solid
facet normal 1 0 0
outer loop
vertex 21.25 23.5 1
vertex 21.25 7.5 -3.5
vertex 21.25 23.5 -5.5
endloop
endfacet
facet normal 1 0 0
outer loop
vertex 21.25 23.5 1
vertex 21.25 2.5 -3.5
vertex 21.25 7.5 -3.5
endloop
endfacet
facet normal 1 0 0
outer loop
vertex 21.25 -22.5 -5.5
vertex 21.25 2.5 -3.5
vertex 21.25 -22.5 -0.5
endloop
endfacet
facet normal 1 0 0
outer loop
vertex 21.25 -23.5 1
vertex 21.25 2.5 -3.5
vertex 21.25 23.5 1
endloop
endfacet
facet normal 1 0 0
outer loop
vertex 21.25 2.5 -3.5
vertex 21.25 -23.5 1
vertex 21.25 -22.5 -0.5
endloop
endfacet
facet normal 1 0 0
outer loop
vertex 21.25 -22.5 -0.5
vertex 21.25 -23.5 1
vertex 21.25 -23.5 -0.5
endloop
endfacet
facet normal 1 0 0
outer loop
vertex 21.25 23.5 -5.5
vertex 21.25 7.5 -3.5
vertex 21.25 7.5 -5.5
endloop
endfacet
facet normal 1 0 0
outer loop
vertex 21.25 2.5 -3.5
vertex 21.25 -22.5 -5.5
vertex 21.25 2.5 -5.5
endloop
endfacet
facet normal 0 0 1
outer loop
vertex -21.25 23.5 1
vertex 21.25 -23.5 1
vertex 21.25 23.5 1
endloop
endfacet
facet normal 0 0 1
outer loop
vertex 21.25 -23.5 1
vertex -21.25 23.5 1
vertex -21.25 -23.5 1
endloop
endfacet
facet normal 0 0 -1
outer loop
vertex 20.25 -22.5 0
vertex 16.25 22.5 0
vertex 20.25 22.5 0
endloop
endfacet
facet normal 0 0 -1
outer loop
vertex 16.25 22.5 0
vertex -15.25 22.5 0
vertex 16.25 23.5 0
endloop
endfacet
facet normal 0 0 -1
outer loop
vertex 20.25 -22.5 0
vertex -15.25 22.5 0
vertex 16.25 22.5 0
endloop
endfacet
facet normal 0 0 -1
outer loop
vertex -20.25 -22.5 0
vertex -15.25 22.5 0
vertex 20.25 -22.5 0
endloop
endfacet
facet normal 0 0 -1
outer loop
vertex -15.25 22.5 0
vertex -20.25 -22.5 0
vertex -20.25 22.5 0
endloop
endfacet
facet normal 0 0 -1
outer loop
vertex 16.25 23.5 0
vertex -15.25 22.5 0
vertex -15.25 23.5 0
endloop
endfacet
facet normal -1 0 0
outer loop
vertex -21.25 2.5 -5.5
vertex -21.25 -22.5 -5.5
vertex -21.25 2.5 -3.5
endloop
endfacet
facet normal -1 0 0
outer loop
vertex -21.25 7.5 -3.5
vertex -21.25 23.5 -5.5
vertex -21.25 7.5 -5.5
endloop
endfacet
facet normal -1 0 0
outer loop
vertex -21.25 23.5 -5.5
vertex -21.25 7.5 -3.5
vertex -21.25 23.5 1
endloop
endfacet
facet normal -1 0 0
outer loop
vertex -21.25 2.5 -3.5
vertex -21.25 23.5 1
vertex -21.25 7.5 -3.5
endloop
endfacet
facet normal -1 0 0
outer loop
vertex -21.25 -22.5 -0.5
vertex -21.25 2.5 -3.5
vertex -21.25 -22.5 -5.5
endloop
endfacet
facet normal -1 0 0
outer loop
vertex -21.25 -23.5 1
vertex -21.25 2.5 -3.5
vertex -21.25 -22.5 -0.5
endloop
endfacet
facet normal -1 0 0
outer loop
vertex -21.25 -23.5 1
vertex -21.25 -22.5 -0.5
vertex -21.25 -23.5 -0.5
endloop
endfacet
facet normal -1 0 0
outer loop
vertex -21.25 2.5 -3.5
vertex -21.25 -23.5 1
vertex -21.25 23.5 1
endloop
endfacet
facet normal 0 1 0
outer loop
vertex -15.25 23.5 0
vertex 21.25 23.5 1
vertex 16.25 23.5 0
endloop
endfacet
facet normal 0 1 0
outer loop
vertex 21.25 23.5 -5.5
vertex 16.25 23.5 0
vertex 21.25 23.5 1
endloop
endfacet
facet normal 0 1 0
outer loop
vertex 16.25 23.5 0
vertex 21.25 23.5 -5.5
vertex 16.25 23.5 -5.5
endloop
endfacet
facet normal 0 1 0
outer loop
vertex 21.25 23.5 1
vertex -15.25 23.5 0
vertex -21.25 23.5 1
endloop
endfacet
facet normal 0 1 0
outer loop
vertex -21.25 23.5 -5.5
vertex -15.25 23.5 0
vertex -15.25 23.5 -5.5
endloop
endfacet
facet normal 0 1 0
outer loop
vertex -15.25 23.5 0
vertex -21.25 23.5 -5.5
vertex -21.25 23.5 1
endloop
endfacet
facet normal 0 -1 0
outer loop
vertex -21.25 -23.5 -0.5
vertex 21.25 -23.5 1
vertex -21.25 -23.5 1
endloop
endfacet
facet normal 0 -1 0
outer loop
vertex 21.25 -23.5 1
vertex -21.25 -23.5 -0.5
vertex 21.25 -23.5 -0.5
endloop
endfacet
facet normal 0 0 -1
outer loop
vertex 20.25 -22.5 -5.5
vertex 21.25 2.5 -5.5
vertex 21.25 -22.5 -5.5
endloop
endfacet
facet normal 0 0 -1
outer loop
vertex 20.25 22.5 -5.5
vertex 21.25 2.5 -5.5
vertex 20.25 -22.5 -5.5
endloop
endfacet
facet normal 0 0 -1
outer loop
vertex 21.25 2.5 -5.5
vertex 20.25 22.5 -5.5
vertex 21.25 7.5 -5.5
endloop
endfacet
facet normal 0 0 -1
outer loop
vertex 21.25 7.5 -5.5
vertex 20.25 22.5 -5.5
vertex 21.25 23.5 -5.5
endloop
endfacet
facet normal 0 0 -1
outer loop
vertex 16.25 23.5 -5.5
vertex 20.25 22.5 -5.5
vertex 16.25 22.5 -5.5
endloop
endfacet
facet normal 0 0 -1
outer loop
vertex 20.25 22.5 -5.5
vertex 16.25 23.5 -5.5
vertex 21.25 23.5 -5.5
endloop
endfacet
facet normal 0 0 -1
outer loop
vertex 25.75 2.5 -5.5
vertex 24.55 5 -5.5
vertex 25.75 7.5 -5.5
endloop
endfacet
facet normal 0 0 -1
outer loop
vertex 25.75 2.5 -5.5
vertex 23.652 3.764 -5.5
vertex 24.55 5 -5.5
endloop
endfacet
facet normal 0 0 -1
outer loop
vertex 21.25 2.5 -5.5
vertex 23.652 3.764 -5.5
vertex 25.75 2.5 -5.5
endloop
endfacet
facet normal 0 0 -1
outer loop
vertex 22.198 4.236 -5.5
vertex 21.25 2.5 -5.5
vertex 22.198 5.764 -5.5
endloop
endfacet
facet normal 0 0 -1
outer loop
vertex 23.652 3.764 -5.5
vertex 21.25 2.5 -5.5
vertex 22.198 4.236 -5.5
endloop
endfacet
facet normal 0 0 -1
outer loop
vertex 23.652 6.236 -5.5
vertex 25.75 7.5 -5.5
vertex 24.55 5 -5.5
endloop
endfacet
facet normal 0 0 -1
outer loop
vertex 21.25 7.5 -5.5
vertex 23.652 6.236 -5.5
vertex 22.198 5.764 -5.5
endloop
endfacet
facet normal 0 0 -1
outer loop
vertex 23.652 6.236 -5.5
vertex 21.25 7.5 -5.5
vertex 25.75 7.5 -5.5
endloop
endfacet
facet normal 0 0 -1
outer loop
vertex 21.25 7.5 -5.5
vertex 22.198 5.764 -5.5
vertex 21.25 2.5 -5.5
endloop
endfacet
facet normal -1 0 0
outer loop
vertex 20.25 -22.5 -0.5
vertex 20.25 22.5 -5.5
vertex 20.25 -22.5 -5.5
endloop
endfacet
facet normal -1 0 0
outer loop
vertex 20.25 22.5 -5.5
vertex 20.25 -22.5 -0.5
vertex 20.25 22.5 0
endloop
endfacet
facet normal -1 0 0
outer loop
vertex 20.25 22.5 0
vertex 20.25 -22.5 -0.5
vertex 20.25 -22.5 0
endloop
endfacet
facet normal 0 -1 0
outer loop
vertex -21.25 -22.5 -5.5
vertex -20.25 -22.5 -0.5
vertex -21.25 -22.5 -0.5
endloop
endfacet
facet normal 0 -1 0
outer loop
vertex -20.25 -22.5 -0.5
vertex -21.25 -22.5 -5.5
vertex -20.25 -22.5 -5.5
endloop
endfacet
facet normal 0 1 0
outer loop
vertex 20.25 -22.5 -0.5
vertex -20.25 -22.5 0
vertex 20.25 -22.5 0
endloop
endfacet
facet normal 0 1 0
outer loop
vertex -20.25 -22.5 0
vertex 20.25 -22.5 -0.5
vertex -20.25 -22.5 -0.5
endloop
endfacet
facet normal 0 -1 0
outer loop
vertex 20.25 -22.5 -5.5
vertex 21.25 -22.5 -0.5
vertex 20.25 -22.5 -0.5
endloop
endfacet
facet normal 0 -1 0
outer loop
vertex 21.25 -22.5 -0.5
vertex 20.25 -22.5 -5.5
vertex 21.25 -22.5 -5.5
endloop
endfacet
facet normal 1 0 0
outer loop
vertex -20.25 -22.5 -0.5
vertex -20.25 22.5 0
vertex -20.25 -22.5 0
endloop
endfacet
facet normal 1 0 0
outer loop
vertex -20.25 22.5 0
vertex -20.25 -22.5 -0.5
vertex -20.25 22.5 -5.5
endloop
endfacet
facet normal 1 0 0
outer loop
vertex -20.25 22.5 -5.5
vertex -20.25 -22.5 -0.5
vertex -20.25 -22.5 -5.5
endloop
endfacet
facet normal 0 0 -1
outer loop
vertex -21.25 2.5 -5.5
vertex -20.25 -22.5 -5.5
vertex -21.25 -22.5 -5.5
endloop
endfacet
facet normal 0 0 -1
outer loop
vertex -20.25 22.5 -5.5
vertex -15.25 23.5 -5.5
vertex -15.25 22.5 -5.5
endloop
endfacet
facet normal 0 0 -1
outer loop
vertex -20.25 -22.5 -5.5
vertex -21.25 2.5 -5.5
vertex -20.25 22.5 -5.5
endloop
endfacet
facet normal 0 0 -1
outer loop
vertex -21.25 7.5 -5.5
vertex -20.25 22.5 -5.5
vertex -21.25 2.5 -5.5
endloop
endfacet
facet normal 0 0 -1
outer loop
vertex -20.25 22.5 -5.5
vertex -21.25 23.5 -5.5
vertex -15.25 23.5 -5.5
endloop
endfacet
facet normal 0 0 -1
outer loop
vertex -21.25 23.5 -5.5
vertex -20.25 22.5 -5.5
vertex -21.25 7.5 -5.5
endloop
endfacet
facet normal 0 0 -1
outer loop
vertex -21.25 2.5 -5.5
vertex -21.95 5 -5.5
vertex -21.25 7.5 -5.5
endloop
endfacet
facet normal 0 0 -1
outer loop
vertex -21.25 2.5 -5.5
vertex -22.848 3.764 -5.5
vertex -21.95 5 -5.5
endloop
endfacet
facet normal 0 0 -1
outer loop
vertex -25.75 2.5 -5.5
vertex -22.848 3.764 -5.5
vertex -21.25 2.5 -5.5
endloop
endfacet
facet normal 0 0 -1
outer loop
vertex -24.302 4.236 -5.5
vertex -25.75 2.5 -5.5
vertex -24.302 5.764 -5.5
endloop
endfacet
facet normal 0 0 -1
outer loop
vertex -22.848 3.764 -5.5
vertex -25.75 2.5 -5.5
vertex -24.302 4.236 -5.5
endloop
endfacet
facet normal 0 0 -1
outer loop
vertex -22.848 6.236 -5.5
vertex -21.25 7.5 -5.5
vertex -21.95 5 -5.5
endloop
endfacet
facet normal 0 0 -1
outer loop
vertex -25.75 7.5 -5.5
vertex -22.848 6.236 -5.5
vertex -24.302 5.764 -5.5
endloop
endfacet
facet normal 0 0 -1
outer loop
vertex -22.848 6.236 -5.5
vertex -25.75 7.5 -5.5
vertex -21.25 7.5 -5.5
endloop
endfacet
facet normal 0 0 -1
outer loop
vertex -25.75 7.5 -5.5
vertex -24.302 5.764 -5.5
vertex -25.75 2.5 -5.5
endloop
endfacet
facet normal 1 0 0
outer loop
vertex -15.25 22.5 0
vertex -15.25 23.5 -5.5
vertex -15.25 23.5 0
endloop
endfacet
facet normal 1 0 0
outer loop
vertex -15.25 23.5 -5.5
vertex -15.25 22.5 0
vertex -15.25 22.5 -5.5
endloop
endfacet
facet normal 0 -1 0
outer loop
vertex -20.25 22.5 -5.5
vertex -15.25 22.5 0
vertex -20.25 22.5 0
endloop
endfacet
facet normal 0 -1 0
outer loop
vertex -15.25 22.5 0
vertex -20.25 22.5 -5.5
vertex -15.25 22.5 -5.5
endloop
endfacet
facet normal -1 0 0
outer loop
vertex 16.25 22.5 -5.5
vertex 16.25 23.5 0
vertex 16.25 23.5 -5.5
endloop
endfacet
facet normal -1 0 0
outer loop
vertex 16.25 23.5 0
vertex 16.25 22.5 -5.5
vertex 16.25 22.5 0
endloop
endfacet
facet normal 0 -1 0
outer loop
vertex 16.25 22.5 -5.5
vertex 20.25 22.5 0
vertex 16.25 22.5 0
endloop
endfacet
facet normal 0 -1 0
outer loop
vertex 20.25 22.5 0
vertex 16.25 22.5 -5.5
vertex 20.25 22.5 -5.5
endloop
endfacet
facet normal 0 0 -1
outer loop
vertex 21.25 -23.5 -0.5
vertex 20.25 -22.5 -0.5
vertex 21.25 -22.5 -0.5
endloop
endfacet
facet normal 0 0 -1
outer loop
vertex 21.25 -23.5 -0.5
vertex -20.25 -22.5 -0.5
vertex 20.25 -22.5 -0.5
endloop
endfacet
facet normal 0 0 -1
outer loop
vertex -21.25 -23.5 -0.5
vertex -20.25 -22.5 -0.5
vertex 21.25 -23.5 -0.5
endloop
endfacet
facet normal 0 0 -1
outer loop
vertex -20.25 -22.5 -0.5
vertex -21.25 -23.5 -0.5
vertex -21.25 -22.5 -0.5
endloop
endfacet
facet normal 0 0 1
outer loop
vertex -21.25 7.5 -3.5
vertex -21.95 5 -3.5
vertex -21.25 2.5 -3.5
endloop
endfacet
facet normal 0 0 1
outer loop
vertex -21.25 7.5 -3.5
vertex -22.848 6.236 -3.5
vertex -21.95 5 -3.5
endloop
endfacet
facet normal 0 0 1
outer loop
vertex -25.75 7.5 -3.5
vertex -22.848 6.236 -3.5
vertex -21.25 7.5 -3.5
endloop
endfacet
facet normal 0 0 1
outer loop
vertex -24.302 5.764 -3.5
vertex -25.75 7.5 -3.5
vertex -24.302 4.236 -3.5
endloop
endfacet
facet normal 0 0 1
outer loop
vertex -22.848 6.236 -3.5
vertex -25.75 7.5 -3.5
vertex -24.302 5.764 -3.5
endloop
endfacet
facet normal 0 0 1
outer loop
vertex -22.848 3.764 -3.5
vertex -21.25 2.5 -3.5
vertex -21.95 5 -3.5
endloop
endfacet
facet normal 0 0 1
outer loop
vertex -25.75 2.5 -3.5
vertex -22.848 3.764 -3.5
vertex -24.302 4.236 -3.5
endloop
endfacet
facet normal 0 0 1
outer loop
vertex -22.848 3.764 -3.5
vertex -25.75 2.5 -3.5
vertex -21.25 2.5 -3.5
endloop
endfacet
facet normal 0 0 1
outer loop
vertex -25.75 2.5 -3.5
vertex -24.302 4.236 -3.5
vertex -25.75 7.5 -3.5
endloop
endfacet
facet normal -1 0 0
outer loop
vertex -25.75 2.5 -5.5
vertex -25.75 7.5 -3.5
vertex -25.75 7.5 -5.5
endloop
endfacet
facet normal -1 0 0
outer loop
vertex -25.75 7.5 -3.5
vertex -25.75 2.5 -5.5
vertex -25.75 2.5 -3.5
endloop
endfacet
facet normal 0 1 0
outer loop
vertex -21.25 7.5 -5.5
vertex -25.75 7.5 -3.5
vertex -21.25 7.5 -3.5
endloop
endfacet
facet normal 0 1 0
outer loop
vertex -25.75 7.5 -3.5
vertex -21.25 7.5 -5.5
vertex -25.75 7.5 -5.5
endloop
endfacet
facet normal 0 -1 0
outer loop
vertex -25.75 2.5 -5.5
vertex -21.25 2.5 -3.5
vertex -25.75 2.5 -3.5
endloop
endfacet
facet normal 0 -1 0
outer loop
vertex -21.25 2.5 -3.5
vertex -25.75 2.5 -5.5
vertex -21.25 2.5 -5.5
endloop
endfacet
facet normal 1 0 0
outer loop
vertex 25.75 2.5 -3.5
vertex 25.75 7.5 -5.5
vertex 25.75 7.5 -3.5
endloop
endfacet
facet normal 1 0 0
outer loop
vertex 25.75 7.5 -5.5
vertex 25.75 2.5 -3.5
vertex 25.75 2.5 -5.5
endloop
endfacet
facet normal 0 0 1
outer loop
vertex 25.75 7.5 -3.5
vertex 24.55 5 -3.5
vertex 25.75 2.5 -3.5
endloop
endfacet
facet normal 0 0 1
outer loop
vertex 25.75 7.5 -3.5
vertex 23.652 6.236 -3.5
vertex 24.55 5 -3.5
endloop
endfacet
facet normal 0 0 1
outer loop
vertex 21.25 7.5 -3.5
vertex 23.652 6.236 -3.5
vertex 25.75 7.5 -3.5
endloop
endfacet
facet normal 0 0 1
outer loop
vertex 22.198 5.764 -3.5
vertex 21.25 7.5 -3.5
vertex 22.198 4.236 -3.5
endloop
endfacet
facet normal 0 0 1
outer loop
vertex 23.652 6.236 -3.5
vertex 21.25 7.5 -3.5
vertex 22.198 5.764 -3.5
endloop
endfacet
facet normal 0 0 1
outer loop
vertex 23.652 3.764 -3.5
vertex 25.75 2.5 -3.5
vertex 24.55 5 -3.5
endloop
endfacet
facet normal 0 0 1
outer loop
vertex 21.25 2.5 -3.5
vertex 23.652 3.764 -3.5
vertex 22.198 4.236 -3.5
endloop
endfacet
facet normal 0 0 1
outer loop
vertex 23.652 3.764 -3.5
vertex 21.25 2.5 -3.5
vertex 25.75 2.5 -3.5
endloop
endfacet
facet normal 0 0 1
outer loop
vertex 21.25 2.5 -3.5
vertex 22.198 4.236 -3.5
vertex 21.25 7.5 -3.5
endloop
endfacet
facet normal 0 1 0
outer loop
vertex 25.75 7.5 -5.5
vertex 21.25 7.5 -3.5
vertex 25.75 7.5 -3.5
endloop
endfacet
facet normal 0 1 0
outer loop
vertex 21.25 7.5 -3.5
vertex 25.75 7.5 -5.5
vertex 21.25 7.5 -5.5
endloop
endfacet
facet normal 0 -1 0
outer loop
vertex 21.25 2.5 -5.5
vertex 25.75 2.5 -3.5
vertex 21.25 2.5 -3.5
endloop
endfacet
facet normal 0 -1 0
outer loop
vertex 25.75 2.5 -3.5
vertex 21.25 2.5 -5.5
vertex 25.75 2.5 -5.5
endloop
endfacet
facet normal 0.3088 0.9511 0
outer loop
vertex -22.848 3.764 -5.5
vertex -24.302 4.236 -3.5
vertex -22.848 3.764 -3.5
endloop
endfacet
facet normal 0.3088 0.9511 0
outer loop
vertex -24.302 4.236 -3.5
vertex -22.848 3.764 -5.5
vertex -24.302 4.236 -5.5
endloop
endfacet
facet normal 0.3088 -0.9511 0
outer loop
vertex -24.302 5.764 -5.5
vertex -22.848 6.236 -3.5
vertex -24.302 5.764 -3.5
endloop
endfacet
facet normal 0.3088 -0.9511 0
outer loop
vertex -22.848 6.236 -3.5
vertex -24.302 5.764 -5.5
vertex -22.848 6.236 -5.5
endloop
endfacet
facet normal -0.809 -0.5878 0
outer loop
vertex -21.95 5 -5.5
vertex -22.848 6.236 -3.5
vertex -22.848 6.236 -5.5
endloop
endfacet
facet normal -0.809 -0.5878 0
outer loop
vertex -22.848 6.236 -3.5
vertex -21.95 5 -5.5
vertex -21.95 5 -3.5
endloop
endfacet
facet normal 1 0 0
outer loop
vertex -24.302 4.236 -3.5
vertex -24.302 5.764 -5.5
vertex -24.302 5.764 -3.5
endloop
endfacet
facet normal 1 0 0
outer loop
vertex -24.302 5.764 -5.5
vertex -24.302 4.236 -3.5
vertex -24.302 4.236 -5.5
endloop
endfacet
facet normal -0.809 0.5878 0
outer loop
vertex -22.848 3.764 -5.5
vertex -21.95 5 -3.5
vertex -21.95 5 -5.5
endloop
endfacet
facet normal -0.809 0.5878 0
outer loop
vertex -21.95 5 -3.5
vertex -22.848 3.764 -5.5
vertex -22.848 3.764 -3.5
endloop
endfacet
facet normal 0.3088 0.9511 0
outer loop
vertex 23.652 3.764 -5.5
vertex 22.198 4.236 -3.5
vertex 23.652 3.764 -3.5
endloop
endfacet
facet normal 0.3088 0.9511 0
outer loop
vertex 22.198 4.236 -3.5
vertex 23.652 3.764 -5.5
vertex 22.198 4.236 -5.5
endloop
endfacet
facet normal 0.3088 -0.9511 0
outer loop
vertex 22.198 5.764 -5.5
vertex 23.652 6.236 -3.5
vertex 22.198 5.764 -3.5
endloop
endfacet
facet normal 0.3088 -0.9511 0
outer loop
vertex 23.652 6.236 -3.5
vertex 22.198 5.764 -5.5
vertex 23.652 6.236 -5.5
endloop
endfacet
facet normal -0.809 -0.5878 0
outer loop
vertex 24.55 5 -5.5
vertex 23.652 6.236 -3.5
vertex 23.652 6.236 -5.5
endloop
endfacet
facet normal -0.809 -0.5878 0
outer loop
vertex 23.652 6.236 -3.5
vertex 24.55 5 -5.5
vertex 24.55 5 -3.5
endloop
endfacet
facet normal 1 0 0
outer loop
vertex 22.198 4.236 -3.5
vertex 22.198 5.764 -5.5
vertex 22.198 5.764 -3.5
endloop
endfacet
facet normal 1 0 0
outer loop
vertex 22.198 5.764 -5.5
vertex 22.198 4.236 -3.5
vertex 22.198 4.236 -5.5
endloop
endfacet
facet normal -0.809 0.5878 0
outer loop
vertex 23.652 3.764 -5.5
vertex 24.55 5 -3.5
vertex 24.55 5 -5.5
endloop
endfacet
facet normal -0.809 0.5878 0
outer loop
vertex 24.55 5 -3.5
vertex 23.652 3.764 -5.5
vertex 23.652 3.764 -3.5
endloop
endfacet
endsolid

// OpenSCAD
WIDTH=40.5;
LENGTH=45;
WALL_THICKNESS=1;
WALL_LENGTH_1=45;//32.5;
WALL_LENGTH_2=4;
WALL_HEIGHT=6;
WALL_HEIGHT_2=0.5;

SCREW_SUPPORT_SIZE=5;
SCREW_SUPPORT_THICKNESS=2;
SCREW_SUPPORT_OFFSET=5;
SCREW_RADIUS=2.6/2;

module bottom() {
    difference() {
    union() {
    translate([0,0,WALL_THICKNESS/2]) cube([WIDTH+2*WALL_THICKNESS, LENGTH+2*WALL_THICKNESS, WALL_THICKNESS], center=true);
        
    /* right and left */
    translate([+(WIDTH+WALL_THICKNESS)/2,(LENGTH-WALL_LENGTH_1)/2+WALL_THICKNESS/2,-WALL_HEIGHT/2+WALL_THICKNESS/2]) cube([WALL_THICKNESS, WALL_LENGTH_1+WALL_THICKNESS, WALL_HEIGHT], center=true);
    
    translate([-(WIDTH+WALL_THICKNESS)/2,(LENGTH-WALL_LENGTH_1)/2+WALL_THICKNESS/2,-WALL_HEIGHT/2+WALL_THICKNESS/2]) cube([WALL_THICKNESS, WALL_LENGTH_1+WALL_THICKNESS, WALL_HEIGHT], center=true);
    
    /* back */
    translate([-(WIDTH-WALL_LENGTH_2)/2+WALL_THICKNESS/2,(LENGTH+WALL_THICKNESS)/2, -WALL_HEIGHT/2+WALL_THICKNESS/2]) cube([WALL_LENGTH_2+WALL_THICKNESS, WALL_THICKNESS, WALL_HEIGHT], center=true);
    
    translate([+(WIDTH-WALL_LENGTH_2)/2+WALL_THICKNESS/2,(LENGTH+WALL_THICKNESS)/2, -WALL_HEIGHT/2+WALL_THICKNESS/2]) cube([WALL_LENGTH_2+WALL_THICKNESS, WALL_THICKNESS, WALL_HEIGHT], center=true);
    
    /* front */
    color("Blue") translate([0,-(LENGTH+WALL_THICKNESS)/2, -WALL_HEIGHT_2/2]) cube([WIDTH+2*WALL_THICKNESS, WALL_THICKNESS, WALL_HEIGHT_2], center=true);
    
    /* screw support */
    translate([-(WIDTH/2+WALL_THICKNESS/2+SCREW_SUPPORT_SIZE/2), SCREW_SUPPORT_OFFSET, SCREW_SUPPORT_THICKNESS/2-WALL_HEIGHT+WALL_THICKNESS/2]) cube([SCREW_SUPPORT_SIZE, SCREW_SUPPORT_SIZE, SCREW_SUPPORT_THICKNESS], center=true);
    translate([+(WIDTH/2+WALL_THICKNESS/2+SCREW_SUPPORT_SIZE/2), SCREW_SUPPORT_OFFSET, SCREW_SUPPORT_THICKNESS/2-WALL_HEIGHT+WALL_THICKNESS/2]) cube([SCREW_SUPPORT_SIZE, SCREW_SUPPORT_SIZE, SCREW_SUPPORT_THICKNESS], center=true);
    }
    union() {
    translate([-(WIDTH/2+WALL_THICKNESS/2+SCREW_SUPPORT_SIZE/2), SCREW_SUPPORT_OFFSET, WALL_HEIGHT/4+WALL_HEIGHT/2+WALL_THICKNESS/2]) cylinder(h=50, r1=SCREW_RADIUS, r2=SCREW_RADIUS, center=true);
    translate([+(WIDTH/2+WALL_THICKNESS/2+SCREW_SUPPORT_SIZE/2), SCREW_SUPPORT_OFFSET, WALL_HEIGHT/4+WALL_HEIGHT/2+WALL_THICKNESS/2]) cylinder(h=50, r1=SCREW_RADIUS, r2=SCREW_RADIUS, center=true);
    }
}
}


bottom();
